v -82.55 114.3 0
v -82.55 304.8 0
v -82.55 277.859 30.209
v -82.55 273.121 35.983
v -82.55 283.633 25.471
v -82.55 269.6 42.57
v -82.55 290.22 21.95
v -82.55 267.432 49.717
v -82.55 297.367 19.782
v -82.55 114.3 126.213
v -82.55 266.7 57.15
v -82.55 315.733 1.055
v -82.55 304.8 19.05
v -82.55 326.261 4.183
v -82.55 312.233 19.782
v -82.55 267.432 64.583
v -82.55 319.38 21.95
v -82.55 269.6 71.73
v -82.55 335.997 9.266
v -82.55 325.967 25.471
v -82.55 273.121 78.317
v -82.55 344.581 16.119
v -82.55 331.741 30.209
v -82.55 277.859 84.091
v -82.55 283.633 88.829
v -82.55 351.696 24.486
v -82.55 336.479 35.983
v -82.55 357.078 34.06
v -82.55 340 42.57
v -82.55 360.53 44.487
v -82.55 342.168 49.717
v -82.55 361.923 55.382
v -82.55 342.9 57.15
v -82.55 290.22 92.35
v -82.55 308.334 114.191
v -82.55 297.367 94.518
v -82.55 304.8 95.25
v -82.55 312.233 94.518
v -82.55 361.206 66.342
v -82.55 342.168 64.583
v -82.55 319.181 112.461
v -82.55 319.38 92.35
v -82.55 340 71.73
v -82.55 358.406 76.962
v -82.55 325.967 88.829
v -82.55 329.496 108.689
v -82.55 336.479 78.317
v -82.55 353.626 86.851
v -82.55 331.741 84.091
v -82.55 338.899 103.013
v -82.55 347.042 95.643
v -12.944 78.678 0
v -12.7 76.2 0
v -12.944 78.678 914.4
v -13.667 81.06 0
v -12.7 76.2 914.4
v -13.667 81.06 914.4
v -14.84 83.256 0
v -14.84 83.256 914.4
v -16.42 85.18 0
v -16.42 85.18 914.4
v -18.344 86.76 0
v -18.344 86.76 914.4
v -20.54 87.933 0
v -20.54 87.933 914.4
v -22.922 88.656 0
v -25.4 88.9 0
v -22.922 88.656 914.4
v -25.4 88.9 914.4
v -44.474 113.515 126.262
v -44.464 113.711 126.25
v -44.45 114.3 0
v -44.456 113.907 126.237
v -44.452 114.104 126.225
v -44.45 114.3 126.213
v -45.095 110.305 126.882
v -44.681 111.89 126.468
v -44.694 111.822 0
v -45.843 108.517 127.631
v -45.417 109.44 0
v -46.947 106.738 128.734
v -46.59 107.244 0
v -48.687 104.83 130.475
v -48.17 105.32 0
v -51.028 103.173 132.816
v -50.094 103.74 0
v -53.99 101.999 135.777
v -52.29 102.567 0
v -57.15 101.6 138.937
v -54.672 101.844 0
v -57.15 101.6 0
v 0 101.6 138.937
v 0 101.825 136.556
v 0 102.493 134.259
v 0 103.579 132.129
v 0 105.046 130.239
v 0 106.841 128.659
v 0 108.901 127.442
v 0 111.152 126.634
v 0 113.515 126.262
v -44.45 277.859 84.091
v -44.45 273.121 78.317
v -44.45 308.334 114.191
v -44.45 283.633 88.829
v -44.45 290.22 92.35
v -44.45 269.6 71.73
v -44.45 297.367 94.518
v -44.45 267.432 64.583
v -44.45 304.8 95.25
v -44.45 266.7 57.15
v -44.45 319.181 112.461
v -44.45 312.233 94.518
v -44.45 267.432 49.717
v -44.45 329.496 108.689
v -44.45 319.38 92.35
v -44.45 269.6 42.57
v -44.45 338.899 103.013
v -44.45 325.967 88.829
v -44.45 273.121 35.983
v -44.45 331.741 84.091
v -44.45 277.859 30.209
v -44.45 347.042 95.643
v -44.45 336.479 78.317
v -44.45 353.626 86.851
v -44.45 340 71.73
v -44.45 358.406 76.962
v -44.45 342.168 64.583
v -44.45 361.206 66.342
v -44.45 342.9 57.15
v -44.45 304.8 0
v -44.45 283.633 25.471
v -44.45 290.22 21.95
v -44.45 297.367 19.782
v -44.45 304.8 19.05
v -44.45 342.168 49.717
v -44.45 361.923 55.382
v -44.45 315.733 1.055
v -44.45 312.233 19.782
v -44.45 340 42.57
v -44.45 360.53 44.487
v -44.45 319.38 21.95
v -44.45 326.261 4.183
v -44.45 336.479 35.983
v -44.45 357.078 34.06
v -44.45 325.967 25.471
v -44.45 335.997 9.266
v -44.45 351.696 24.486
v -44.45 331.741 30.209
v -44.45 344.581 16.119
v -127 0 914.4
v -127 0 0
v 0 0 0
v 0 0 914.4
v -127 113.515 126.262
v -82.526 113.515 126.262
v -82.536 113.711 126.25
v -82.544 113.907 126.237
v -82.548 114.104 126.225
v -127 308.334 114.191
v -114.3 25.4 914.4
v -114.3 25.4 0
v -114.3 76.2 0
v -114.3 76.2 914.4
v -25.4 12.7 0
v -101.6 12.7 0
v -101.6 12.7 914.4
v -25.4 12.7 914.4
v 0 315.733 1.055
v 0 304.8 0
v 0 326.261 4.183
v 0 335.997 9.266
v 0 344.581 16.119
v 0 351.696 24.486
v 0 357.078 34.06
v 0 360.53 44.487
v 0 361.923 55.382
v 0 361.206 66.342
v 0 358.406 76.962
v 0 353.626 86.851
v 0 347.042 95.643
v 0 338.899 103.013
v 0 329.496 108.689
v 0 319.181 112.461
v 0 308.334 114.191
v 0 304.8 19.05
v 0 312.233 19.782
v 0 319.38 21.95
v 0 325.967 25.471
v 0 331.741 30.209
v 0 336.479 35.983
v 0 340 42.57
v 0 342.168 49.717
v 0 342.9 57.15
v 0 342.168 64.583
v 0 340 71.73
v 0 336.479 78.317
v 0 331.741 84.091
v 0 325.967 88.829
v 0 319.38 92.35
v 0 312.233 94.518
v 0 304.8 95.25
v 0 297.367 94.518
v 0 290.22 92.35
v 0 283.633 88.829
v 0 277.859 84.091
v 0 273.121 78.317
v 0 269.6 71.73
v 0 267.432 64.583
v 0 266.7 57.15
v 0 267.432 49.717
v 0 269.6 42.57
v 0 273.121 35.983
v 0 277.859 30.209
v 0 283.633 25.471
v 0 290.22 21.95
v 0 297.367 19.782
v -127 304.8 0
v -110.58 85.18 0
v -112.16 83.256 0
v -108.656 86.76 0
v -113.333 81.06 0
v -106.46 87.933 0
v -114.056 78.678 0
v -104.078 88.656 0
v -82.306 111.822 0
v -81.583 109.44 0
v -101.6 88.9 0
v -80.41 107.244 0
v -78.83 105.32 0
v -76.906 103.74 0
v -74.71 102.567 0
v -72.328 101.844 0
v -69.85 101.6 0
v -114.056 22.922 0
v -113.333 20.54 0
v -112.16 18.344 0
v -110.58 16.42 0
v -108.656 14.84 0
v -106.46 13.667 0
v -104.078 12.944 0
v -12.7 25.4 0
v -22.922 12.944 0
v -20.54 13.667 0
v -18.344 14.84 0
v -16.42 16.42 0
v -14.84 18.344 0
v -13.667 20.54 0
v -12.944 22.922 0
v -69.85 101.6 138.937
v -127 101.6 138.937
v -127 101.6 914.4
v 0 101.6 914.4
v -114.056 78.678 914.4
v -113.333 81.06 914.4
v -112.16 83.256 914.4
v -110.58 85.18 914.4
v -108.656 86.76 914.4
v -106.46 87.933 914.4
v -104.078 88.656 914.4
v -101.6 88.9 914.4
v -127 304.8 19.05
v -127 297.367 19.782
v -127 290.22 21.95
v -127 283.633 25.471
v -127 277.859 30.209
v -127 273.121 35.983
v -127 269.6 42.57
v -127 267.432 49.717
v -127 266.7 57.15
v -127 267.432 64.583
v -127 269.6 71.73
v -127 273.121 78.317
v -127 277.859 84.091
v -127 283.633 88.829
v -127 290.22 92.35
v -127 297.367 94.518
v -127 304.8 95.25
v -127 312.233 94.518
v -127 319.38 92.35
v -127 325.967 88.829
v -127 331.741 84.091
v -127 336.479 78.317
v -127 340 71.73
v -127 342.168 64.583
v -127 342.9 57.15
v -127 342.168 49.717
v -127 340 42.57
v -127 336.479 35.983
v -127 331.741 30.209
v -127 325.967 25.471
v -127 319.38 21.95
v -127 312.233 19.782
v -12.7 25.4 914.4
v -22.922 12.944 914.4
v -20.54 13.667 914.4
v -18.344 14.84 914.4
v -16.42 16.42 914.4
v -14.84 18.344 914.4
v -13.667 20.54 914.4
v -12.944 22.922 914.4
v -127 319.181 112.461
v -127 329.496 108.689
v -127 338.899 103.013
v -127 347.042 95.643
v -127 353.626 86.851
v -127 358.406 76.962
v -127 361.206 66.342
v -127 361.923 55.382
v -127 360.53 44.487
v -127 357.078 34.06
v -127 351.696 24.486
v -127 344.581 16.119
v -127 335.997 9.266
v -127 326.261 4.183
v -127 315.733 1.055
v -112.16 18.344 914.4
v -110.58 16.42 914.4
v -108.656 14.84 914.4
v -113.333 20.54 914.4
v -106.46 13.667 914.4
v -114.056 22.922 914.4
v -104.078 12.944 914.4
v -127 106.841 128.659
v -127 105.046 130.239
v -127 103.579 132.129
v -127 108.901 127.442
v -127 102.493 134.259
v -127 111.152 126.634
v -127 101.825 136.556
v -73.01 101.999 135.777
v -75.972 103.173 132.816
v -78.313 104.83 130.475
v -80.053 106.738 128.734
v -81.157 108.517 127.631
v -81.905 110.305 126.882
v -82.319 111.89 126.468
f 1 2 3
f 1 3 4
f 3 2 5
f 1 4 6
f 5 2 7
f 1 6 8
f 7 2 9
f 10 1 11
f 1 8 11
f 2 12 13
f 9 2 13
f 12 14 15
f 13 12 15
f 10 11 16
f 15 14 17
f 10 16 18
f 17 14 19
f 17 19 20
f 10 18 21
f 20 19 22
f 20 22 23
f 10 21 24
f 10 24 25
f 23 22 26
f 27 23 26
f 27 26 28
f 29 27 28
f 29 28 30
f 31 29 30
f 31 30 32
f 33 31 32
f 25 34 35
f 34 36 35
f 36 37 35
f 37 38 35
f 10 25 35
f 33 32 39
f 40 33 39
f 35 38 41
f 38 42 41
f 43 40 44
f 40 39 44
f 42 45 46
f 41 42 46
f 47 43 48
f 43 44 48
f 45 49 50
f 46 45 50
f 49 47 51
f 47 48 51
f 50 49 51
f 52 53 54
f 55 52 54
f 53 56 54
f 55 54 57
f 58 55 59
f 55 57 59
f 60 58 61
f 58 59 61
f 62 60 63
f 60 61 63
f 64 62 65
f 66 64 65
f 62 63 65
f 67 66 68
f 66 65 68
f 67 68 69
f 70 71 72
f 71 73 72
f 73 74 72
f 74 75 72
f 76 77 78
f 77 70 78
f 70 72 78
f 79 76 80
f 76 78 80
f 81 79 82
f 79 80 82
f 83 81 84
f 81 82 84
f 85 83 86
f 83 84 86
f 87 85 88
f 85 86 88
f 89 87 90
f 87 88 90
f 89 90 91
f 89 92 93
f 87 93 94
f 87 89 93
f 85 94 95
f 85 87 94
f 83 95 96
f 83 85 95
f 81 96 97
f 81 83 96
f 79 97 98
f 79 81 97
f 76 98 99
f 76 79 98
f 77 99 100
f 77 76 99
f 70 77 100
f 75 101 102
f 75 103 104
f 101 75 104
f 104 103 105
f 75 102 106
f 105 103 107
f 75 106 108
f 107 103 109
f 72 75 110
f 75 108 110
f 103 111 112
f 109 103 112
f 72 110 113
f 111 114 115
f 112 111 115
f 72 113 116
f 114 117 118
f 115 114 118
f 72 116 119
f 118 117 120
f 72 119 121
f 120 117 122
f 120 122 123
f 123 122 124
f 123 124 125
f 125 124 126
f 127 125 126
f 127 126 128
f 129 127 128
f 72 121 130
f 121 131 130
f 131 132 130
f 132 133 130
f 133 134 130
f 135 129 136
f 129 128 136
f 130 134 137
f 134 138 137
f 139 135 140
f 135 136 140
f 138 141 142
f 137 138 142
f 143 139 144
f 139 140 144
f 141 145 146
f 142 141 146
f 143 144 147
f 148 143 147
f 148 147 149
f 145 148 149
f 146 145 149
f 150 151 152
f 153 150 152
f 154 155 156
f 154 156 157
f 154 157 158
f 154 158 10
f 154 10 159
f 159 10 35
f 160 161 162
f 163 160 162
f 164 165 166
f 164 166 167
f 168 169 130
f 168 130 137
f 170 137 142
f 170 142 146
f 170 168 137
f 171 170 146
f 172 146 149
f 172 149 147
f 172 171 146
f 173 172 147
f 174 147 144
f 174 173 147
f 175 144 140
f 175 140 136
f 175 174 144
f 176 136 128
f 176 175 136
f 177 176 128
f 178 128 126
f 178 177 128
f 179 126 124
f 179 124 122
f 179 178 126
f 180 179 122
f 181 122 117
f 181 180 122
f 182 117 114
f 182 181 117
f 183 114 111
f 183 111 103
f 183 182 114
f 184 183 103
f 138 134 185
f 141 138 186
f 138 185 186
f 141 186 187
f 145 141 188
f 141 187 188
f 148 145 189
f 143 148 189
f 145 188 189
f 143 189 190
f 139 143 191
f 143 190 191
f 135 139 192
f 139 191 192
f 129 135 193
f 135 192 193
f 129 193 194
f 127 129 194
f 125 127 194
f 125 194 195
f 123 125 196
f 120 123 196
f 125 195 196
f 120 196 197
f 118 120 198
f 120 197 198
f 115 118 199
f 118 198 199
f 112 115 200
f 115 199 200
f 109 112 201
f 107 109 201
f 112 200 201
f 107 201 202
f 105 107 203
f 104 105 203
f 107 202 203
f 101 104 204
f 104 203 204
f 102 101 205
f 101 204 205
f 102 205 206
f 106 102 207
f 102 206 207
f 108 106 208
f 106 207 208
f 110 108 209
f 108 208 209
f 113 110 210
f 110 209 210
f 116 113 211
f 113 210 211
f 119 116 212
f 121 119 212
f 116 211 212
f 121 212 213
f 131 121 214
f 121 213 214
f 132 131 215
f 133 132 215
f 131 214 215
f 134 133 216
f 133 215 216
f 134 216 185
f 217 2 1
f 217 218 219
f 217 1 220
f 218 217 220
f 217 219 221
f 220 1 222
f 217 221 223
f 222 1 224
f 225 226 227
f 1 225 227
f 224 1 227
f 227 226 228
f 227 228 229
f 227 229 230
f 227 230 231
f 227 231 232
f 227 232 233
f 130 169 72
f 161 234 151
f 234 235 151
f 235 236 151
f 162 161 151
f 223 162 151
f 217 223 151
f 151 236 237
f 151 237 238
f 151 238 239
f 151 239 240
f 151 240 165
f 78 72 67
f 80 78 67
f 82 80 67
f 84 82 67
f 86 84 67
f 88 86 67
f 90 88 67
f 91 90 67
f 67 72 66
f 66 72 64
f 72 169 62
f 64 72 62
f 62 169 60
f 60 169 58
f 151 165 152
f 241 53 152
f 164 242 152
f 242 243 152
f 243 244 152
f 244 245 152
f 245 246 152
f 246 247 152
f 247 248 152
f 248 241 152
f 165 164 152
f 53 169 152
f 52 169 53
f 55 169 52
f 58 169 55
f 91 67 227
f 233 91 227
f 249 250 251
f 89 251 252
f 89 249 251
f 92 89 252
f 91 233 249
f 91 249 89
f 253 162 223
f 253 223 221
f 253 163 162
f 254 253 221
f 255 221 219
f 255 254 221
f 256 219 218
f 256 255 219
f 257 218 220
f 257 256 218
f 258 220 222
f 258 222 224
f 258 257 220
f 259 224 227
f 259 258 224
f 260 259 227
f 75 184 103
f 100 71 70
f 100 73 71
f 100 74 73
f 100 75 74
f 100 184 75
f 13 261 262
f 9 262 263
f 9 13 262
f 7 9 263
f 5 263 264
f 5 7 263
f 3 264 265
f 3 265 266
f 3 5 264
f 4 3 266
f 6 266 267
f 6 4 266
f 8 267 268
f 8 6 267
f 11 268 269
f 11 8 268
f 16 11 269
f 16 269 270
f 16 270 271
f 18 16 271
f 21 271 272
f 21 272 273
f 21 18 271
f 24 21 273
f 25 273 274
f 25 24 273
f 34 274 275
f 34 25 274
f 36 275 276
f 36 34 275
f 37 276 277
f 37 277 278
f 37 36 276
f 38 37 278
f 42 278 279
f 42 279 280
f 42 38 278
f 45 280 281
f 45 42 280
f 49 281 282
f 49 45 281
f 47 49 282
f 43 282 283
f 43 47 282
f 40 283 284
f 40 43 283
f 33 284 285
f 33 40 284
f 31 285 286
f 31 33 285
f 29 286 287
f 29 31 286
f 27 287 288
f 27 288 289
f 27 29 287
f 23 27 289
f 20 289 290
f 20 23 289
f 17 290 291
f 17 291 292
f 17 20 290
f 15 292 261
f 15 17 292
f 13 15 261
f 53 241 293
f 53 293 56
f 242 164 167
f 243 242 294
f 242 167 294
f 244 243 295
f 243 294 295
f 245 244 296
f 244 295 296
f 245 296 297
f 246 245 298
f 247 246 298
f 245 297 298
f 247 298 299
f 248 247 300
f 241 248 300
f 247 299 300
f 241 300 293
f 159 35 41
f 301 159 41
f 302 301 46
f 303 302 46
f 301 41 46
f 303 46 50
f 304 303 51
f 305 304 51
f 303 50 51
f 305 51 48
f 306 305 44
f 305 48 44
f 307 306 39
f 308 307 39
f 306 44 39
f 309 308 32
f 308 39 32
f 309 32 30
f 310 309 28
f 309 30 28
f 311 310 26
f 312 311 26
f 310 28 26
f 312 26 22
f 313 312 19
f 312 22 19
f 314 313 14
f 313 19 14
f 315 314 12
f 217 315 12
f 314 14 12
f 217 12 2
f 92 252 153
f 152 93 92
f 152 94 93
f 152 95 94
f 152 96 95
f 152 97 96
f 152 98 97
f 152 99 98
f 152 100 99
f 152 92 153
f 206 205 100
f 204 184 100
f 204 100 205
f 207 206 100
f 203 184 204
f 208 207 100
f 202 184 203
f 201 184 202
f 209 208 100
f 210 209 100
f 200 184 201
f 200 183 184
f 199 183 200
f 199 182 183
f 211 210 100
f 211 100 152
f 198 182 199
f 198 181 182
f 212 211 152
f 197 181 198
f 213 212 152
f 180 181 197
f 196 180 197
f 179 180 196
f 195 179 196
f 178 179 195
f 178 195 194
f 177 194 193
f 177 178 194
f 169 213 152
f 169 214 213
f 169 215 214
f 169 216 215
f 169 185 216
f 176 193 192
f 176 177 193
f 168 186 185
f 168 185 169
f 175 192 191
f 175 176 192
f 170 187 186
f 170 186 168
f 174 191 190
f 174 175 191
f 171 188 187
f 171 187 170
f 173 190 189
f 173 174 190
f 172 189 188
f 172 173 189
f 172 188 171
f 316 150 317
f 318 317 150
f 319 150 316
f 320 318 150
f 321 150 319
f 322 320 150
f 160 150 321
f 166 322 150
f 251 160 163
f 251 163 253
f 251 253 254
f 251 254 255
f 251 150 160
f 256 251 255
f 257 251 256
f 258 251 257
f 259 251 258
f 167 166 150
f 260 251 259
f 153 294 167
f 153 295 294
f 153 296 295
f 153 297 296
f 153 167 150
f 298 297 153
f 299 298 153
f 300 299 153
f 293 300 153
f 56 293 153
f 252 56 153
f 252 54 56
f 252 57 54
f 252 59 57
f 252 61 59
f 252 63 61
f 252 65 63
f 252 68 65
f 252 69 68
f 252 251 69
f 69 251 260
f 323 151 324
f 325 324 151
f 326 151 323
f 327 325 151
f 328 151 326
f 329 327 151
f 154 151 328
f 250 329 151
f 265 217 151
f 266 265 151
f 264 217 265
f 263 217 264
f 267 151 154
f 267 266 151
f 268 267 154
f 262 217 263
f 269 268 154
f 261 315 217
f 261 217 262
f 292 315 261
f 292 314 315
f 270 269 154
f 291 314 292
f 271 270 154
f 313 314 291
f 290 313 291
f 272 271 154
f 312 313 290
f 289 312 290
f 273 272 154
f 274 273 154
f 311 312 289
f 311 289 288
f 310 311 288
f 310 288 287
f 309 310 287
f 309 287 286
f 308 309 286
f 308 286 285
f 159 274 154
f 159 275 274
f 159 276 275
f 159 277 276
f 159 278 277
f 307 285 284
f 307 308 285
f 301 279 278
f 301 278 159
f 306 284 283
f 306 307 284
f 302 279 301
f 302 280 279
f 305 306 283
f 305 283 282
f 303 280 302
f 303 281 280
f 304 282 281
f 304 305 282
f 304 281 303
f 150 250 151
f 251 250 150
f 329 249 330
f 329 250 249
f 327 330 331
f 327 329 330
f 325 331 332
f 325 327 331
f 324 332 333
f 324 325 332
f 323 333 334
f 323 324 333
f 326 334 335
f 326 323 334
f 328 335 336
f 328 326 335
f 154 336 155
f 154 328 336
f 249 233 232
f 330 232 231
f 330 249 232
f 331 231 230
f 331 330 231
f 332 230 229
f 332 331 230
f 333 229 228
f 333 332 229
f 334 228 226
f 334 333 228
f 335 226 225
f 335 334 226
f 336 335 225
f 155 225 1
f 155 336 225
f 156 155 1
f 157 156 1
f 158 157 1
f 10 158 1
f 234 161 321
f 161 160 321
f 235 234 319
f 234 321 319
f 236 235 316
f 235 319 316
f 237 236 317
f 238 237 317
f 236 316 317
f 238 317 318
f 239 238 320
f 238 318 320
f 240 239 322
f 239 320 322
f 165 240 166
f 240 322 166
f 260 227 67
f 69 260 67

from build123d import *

# Parameters (mm, degrees)
SKETCH2_W           = 127
SKETCH2_H           = 101.6
SKETCH2_W_2         = 101.6
SKETCH2_H_2         = 76.2
BOSS_EXTRUDE2_DEPTH = 914.4
SKETCH1_R           = 38.1
BOSS_EXTRUDE3_DEPTH = 44.45
BOSS_EXTRUDE5_START = -44.45
SKETCH3_R           = 38.1
BOSS_EXTRUDE5_DEPTH = 44.45
FILLET1_R           = 12.7
FILLET2_R           = 12.7


with BuildPart() as part:
    # Sketch2 → Boss-Extrude2 (new body)
    with BuildSketch(Plane.XY):
        with Locations((-63.5, 50.8)):
            Rectangle(SKETCH2_W, SKETCH2_H)
        with Locations((-63.5, 50.8)):
            Rectangle(SKETCH2_W_2, SKETCH2_H_2, mode=Mode.SUBTRACT)
    extrude(amount=BOSS_EXTRUDE2_DEPTH)

    # Sketch1 → Boss-Extrude3 (add)
    with BuildSketch(Plane(origin=(0, 0, 0), x_dir=(0, 0, -1), z_dir=(1, 0, 0))):
        with BuildLine():
            Line((-127, 101.6), (0, 101.6))
            Line((0, 101.6), (0, 304.8))
            ThreePointArc((0, 304.8), (-55.382017361, 361.922646449), (-114.190611982, 308.334272869))
            Line((-114.190611982, 308.334272869), (-127, 101.6))
        make_face()
        with Locations((-57.15, 304.8)):
            Circle(SKETCH1_R, mode=Mode.SUBTRACT)
    extrude(amount=-BOSS_EXTRUDE3_DEPTH)

    # Sketch3 → Boss-Extrude5 (add)
    with BuildSketch(Plane.ZY.offset(127).offset(BOSS_EXTRUDE5_START)):
        with BuildLine():
            Line((0, 304.8), (0, 101.6))
            Line((0, 101.6), (127, 101.6))
            Line((127, 101.6), (114.190611982, 308.334272869))
            ThreePointArc((114.190611982, 308.334272869), (55.382017361, 361.922646449), (0, 304.8))
        make_face()
        with Locations(Location((57.15, 304.8, 0), (0, 0, 180))):
            Circle(SKETCH3_R, mode=Mode.SUBTRACT)
    extrude(amount=BOSS_EXTRUDE5_DEPTH)

    # Fillet1
    fillet1_edges = [part.edges().sort_by_distance(p)[0] for p in [
        (-12.7, 88.9, 457.2),
        (-114.3, 88.9, 457.2),
        (-114.3, 12.7, 457.2),
        (-12.7, 12.7, 457.2),
    ]]
    fillet(fillet1_edges, radius=FILLET1_R)

    # Fillet2
    fillet2_edges = [part.edges().sort_by_distance(p)[0] for p in [
        (-44.45, 101.6, 63.5),
        (-22.225, 101.6, 127),
        (-82.55, 101.6, 63.5),
        (-104.775, 101.6, 127),
    ]]
    fillet(fillet2_edges, radius=FILLET2_R)


solid = part.part
